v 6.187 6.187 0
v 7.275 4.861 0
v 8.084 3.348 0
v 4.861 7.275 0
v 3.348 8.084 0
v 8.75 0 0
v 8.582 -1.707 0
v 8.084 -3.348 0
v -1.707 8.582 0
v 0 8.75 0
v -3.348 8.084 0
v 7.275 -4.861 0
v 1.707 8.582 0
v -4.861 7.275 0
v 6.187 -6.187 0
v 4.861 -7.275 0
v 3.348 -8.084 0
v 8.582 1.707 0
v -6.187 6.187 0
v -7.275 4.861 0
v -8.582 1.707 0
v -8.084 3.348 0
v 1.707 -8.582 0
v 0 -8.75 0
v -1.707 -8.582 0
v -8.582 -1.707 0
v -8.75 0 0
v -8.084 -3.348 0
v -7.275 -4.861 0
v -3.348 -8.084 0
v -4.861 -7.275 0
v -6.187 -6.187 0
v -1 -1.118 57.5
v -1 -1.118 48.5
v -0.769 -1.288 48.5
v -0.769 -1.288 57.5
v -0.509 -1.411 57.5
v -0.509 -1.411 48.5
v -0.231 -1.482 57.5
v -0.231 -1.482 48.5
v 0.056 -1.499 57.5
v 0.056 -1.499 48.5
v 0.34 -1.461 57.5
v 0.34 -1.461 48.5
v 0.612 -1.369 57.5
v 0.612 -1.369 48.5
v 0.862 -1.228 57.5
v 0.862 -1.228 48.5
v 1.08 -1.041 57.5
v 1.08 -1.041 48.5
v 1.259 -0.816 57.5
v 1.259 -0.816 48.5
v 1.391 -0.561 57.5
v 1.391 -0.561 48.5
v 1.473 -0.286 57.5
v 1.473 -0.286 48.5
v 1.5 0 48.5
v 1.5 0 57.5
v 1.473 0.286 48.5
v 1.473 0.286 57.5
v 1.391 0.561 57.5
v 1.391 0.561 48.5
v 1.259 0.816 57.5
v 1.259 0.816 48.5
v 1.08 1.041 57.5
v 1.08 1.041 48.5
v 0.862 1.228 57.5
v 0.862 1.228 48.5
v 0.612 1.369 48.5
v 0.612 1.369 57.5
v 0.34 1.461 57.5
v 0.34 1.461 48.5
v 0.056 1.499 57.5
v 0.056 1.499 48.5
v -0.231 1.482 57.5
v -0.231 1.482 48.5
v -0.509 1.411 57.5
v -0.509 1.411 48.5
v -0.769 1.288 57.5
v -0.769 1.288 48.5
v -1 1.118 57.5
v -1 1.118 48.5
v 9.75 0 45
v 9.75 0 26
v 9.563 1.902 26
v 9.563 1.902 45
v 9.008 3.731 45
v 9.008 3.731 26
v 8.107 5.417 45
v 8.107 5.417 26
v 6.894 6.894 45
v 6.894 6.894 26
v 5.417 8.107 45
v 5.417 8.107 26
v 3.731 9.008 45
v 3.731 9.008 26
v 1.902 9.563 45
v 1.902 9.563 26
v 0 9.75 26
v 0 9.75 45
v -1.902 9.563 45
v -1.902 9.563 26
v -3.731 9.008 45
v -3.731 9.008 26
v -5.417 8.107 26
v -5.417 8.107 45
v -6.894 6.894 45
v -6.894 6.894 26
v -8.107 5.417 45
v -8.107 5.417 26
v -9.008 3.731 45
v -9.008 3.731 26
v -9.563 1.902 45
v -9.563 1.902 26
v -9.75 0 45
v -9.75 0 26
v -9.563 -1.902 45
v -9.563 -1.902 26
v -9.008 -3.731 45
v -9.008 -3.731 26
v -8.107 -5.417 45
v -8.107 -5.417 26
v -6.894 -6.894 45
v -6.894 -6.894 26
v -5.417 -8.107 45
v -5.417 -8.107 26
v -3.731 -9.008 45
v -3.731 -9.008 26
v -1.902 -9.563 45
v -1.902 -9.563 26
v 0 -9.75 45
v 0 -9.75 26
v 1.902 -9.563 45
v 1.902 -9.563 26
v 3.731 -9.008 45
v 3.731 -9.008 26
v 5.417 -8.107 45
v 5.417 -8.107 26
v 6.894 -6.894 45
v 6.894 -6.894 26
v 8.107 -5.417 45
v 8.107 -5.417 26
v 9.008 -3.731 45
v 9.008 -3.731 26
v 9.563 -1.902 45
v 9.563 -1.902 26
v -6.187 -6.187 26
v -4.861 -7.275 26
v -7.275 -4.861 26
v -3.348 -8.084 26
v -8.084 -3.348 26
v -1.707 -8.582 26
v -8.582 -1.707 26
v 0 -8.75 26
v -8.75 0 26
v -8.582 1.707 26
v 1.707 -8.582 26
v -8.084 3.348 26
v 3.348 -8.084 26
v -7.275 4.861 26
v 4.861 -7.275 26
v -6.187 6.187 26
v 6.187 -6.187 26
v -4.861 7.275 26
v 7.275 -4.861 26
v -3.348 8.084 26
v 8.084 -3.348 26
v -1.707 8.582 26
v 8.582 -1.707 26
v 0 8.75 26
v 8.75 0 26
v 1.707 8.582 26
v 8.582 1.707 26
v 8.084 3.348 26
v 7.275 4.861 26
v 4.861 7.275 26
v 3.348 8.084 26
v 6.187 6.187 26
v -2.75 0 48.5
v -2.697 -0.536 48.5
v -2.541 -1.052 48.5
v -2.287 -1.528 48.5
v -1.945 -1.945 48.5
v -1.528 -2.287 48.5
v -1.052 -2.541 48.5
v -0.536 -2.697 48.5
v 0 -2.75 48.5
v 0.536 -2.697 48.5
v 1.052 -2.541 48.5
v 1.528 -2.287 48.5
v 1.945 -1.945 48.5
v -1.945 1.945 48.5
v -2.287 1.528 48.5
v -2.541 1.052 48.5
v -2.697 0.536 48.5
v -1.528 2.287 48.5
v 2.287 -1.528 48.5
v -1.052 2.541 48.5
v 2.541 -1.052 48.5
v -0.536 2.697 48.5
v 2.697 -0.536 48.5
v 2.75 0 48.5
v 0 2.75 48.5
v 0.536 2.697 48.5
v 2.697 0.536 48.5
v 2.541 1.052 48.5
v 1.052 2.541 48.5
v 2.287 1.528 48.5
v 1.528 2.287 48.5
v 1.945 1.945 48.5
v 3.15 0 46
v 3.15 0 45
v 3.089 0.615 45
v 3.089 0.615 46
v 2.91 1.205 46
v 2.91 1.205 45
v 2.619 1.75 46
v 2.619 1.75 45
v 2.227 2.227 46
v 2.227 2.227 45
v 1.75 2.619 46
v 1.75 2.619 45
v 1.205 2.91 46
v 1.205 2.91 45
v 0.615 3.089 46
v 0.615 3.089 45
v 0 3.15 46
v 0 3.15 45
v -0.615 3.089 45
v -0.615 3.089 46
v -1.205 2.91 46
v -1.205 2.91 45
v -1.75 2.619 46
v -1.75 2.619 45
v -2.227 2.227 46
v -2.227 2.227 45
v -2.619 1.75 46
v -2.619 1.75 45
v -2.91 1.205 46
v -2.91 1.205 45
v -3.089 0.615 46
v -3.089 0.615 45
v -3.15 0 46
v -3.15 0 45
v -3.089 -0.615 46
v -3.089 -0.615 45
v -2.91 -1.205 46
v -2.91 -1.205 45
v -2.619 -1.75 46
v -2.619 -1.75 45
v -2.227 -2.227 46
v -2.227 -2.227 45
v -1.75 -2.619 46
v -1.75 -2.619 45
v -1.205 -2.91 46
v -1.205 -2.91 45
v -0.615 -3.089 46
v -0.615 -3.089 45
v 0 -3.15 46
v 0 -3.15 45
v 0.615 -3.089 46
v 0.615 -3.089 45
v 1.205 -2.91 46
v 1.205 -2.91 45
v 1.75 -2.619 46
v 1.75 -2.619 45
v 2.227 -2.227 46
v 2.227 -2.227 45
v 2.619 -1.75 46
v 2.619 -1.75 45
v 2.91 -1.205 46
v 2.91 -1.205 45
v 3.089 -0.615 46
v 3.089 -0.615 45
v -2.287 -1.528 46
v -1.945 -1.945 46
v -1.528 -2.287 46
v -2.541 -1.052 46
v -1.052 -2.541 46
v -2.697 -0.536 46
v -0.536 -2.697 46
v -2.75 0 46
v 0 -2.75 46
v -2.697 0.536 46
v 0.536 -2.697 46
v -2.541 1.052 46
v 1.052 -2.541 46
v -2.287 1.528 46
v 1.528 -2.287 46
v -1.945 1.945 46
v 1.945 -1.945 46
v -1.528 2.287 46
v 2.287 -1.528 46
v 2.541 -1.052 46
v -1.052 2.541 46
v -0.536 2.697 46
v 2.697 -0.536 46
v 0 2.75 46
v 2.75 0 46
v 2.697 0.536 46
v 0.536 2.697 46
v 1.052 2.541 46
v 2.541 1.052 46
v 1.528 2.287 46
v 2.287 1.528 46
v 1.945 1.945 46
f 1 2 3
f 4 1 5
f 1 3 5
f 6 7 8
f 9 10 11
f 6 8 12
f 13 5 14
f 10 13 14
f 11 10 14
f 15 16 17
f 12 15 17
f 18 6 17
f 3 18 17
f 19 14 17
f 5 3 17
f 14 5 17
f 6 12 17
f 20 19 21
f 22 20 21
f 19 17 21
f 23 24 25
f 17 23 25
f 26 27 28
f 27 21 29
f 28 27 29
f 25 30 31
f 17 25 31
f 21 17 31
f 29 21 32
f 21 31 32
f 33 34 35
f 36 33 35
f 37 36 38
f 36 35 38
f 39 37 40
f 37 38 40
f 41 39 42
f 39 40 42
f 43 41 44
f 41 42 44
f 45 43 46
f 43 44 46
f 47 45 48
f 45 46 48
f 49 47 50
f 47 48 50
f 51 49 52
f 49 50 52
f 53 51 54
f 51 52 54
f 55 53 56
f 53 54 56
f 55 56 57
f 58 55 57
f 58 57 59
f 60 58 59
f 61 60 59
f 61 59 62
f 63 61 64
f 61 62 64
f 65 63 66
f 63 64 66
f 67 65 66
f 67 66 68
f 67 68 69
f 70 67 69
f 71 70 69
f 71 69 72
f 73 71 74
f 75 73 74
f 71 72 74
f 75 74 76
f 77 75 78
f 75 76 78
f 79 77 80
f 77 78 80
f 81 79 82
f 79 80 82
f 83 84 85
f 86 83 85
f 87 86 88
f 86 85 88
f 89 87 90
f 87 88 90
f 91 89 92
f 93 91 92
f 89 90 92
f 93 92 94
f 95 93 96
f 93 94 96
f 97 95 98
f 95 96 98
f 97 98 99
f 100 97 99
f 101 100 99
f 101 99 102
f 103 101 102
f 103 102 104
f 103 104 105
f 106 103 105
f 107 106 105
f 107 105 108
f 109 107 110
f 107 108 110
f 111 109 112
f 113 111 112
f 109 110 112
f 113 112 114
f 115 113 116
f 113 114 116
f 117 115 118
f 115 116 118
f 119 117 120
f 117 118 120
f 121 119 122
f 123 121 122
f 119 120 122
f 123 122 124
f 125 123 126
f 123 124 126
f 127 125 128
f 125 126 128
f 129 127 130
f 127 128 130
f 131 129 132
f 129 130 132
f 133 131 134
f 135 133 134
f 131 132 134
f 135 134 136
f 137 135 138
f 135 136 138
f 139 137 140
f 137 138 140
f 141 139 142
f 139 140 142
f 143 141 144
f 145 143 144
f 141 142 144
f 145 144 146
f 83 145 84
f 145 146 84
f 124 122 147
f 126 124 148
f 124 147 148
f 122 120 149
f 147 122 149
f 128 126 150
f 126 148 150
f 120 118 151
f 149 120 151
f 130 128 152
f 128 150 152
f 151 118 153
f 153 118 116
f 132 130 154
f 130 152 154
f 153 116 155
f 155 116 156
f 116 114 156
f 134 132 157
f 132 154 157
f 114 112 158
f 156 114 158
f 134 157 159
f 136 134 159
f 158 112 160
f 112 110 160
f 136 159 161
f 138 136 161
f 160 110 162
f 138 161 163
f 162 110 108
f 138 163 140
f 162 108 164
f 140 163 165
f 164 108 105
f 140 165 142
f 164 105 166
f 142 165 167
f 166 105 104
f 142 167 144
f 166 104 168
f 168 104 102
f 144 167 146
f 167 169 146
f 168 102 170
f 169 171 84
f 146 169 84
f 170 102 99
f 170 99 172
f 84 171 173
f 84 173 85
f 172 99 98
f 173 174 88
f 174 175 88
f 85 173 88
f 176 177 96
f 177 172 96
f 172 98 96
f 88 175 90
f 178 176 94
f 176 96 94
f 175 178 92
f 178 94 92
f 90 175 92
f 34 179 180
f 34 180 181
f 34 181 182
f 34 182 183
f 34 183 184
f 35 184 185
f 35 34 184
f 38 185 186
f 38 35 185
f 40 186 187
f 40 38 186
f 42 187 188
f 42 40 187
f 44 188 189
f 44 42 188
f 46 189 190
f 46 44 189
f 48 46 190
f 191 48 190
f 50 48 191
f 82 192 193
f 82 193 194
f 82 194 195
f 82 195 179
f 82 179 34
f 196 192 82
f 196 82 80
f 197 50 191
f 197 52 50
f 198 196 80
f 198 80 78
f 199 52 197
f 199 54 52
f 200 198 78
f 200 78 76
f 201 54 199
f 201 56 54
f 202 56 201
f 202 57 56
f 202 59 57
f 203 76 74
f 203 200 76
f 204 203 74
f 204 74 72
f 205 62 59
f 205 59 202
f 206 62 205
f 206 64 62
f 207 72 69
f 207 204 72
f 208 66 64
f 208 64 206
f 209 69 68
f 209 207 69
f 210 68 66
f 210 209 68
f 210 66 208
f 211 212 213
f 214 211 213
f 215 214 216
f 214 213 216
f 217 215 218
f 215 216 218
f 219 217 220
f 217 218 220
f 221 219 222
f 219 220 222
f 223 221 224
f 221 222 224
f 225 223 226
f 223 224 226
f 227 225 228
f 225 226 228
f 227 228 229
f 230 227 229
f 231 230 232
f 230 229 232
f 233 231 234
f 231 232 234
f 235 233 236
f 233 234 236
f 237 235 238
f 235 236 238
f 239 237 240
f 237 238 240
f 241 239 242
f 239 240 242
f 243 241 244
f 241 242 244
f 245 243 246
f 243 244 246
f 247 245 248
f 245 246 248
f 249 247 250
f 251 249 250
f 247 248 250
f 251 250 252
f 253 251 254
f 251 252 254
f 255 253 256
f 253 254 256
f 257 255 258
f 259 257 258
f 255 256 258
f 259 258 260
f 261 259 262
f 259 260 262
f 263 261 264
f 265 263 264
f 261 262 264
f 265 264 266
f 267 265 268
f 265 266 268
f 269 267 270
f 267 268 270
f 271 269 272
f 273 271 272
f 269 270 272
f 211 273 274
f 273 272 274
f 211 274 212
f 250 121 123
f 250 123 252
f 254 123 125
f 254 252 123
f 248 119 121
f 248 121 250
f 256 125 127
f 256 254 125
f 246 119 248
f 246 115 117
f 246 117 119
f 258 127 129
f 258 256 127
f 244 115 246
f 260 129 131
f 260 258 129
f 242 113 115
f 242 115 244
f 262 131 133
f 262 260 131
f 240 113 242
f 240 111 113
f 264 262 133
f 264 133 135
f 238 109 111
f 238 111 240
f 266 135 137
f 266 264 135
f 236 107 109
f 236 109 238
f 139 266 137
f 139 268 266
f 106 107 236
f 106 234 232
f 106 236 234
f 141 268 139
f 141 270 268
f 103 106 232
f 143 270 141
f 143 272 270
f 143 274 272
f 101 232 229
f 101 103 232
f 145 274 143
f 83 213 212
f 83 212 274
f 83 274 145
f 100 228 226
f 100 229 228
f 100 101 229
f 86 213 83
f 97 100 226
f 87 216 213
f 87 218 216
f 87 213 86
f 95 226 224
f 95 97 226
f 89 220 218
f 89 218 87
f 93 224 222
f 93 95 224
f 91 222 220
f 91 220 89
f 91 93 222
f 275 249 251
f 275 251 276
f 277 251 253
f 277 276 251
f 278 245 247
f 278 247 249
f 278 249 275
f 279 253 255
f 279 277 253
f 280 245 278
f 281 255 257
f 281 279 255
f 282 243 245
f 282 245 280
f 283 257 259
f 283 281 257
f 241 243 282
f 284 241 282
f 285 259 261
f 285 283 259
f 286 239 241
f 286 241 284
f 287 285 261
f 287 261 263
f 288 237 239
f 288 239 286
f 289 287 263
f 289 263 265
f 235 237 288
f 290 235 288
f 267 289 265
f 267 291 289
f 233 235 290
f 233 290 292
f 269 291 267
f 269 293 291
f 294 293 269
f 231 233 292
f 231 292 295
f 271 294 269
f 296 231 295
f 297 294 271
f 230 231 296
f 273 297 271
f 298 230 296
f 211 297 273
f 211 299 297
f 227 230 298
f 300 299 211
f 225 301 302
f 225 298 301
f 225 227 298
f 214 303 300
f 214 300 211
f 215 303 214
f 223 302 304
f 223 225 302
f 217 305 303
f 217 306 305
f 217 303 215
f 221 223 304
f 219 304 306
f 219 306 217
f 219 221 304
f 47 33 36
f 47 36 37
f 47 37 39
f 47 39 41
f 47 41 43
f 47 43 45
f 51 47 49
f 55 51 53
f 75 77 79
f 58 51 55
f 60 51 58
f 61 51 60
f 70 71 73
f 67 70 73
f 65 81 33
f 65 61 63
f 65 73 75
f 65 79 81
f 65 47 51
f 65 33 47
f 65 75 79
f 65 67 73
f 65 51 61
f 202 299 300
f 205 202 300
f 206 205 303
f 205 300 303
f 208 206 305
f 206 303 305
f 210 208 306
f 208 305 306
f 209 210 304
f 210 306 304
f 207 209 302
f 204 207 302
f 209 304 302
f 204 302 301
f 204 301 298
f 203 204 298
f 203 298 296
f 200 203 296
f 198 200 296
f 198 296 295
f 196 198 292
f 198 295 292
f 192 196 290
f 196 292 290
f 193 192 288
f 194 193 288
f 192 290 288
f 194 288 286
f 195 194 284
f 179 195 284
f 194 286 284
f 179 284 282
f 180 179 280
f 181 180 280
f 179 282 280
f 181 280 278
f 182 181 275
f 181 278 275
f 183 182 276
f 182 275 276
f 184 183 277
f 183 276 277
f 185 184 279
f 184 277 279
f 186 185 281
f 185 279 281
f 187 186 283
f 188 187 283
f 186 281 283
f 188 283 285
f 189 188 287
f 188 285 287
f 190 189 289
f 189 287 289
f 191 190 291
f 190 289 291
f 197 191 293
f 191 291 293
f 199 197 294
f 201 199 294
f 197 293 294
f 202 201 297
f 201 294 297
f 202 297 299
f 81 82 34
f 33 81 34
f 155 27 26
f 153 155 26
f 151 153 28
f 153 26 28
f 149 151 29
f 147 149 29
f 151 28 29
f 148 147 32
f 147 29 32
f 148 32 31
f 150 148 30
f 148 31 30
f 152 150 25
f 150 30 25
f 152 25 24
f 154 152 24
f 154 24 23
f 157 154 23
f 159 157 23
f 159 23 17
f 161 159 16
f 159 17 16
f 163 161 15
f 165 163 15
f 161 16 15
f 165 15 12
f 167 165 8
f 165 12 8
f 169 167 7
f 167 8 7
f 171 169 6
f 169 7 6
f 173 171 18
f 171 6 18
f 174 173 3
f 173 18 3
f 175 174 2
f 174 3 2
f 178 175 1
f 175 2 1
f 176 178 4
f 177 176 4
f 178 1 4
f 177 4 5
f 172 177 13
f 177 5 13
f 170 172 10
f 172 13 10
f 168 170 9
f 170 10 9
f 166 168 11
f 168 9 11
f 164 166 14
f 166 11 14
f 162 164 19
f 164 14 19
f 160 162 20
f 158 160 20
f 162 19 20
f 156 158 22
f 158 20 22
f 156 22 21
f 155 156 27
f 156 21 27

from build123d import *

# Parameters (mm, degrees)
SKETCH1_R           = 8.75
BOSS_EXTRUDE1_DEPTH = 26
SKETCH2_R           = 9.75
BOSS_EXTRUDE2_DEPTH = 19
SKETCH3_R           = 3.15
BOSS_EXTRUDE3_DEPTH = 1
SKETCH4_R           = 2.75
BOSS_EXTRUDE4_DEPTH = 2.5
BOSS_EXTRUDE5_DEPTH = 9


with BuildPart() as part:
    # Sketch1 → Boss-Extrude1 (new body)
    with BuildSketch(Plane.XY):
        with Locations(Location((0, 0, 0), (0, 0, 180))):
            Circle(SKETCH1_R)
    extrude(amount=BOSS_EXTRUDE1_DEPTH)

    # Sketch2 → Boss-Extrude2 (add)
    with BuildSketch(Plane.XY.offset(26)):
        Circle(SKETCH2_R)
    extrude(amount=BOSS_EXTRUDE2_DEPTH)

    # Sketch3 → Boss-Extrude3 (add)
    with BuildSketch(Plane.XY.offset(45)):
        Circle(SKETCH3_R)
    extrude(amount=BOSS_EXTRUDE3_DEPTH)

    # Sketch4 → Boss-Extrude4 (add)
    with BuildSketch(Plane.XY.offset(46)):
        Circle(SKETCH4_R)
    extrude(amount=BOSS_EXTRUDE4_DEPTH)

    # Sketch5 → Boss-Extrude5 (add)
    with BuildSketch(Plane.XY.offset(48.5)):
        with BuildLine():
            Line((-1, 1.118033989), (-1, -1.118033989))
            ThreePointArc((-1, -1.118033989), (1.5, 0), (-1, 1.118033989))
        make_face()
    extrude(amount=BOSS_EXTRUDE5_DEPTH)


solid = part.part
